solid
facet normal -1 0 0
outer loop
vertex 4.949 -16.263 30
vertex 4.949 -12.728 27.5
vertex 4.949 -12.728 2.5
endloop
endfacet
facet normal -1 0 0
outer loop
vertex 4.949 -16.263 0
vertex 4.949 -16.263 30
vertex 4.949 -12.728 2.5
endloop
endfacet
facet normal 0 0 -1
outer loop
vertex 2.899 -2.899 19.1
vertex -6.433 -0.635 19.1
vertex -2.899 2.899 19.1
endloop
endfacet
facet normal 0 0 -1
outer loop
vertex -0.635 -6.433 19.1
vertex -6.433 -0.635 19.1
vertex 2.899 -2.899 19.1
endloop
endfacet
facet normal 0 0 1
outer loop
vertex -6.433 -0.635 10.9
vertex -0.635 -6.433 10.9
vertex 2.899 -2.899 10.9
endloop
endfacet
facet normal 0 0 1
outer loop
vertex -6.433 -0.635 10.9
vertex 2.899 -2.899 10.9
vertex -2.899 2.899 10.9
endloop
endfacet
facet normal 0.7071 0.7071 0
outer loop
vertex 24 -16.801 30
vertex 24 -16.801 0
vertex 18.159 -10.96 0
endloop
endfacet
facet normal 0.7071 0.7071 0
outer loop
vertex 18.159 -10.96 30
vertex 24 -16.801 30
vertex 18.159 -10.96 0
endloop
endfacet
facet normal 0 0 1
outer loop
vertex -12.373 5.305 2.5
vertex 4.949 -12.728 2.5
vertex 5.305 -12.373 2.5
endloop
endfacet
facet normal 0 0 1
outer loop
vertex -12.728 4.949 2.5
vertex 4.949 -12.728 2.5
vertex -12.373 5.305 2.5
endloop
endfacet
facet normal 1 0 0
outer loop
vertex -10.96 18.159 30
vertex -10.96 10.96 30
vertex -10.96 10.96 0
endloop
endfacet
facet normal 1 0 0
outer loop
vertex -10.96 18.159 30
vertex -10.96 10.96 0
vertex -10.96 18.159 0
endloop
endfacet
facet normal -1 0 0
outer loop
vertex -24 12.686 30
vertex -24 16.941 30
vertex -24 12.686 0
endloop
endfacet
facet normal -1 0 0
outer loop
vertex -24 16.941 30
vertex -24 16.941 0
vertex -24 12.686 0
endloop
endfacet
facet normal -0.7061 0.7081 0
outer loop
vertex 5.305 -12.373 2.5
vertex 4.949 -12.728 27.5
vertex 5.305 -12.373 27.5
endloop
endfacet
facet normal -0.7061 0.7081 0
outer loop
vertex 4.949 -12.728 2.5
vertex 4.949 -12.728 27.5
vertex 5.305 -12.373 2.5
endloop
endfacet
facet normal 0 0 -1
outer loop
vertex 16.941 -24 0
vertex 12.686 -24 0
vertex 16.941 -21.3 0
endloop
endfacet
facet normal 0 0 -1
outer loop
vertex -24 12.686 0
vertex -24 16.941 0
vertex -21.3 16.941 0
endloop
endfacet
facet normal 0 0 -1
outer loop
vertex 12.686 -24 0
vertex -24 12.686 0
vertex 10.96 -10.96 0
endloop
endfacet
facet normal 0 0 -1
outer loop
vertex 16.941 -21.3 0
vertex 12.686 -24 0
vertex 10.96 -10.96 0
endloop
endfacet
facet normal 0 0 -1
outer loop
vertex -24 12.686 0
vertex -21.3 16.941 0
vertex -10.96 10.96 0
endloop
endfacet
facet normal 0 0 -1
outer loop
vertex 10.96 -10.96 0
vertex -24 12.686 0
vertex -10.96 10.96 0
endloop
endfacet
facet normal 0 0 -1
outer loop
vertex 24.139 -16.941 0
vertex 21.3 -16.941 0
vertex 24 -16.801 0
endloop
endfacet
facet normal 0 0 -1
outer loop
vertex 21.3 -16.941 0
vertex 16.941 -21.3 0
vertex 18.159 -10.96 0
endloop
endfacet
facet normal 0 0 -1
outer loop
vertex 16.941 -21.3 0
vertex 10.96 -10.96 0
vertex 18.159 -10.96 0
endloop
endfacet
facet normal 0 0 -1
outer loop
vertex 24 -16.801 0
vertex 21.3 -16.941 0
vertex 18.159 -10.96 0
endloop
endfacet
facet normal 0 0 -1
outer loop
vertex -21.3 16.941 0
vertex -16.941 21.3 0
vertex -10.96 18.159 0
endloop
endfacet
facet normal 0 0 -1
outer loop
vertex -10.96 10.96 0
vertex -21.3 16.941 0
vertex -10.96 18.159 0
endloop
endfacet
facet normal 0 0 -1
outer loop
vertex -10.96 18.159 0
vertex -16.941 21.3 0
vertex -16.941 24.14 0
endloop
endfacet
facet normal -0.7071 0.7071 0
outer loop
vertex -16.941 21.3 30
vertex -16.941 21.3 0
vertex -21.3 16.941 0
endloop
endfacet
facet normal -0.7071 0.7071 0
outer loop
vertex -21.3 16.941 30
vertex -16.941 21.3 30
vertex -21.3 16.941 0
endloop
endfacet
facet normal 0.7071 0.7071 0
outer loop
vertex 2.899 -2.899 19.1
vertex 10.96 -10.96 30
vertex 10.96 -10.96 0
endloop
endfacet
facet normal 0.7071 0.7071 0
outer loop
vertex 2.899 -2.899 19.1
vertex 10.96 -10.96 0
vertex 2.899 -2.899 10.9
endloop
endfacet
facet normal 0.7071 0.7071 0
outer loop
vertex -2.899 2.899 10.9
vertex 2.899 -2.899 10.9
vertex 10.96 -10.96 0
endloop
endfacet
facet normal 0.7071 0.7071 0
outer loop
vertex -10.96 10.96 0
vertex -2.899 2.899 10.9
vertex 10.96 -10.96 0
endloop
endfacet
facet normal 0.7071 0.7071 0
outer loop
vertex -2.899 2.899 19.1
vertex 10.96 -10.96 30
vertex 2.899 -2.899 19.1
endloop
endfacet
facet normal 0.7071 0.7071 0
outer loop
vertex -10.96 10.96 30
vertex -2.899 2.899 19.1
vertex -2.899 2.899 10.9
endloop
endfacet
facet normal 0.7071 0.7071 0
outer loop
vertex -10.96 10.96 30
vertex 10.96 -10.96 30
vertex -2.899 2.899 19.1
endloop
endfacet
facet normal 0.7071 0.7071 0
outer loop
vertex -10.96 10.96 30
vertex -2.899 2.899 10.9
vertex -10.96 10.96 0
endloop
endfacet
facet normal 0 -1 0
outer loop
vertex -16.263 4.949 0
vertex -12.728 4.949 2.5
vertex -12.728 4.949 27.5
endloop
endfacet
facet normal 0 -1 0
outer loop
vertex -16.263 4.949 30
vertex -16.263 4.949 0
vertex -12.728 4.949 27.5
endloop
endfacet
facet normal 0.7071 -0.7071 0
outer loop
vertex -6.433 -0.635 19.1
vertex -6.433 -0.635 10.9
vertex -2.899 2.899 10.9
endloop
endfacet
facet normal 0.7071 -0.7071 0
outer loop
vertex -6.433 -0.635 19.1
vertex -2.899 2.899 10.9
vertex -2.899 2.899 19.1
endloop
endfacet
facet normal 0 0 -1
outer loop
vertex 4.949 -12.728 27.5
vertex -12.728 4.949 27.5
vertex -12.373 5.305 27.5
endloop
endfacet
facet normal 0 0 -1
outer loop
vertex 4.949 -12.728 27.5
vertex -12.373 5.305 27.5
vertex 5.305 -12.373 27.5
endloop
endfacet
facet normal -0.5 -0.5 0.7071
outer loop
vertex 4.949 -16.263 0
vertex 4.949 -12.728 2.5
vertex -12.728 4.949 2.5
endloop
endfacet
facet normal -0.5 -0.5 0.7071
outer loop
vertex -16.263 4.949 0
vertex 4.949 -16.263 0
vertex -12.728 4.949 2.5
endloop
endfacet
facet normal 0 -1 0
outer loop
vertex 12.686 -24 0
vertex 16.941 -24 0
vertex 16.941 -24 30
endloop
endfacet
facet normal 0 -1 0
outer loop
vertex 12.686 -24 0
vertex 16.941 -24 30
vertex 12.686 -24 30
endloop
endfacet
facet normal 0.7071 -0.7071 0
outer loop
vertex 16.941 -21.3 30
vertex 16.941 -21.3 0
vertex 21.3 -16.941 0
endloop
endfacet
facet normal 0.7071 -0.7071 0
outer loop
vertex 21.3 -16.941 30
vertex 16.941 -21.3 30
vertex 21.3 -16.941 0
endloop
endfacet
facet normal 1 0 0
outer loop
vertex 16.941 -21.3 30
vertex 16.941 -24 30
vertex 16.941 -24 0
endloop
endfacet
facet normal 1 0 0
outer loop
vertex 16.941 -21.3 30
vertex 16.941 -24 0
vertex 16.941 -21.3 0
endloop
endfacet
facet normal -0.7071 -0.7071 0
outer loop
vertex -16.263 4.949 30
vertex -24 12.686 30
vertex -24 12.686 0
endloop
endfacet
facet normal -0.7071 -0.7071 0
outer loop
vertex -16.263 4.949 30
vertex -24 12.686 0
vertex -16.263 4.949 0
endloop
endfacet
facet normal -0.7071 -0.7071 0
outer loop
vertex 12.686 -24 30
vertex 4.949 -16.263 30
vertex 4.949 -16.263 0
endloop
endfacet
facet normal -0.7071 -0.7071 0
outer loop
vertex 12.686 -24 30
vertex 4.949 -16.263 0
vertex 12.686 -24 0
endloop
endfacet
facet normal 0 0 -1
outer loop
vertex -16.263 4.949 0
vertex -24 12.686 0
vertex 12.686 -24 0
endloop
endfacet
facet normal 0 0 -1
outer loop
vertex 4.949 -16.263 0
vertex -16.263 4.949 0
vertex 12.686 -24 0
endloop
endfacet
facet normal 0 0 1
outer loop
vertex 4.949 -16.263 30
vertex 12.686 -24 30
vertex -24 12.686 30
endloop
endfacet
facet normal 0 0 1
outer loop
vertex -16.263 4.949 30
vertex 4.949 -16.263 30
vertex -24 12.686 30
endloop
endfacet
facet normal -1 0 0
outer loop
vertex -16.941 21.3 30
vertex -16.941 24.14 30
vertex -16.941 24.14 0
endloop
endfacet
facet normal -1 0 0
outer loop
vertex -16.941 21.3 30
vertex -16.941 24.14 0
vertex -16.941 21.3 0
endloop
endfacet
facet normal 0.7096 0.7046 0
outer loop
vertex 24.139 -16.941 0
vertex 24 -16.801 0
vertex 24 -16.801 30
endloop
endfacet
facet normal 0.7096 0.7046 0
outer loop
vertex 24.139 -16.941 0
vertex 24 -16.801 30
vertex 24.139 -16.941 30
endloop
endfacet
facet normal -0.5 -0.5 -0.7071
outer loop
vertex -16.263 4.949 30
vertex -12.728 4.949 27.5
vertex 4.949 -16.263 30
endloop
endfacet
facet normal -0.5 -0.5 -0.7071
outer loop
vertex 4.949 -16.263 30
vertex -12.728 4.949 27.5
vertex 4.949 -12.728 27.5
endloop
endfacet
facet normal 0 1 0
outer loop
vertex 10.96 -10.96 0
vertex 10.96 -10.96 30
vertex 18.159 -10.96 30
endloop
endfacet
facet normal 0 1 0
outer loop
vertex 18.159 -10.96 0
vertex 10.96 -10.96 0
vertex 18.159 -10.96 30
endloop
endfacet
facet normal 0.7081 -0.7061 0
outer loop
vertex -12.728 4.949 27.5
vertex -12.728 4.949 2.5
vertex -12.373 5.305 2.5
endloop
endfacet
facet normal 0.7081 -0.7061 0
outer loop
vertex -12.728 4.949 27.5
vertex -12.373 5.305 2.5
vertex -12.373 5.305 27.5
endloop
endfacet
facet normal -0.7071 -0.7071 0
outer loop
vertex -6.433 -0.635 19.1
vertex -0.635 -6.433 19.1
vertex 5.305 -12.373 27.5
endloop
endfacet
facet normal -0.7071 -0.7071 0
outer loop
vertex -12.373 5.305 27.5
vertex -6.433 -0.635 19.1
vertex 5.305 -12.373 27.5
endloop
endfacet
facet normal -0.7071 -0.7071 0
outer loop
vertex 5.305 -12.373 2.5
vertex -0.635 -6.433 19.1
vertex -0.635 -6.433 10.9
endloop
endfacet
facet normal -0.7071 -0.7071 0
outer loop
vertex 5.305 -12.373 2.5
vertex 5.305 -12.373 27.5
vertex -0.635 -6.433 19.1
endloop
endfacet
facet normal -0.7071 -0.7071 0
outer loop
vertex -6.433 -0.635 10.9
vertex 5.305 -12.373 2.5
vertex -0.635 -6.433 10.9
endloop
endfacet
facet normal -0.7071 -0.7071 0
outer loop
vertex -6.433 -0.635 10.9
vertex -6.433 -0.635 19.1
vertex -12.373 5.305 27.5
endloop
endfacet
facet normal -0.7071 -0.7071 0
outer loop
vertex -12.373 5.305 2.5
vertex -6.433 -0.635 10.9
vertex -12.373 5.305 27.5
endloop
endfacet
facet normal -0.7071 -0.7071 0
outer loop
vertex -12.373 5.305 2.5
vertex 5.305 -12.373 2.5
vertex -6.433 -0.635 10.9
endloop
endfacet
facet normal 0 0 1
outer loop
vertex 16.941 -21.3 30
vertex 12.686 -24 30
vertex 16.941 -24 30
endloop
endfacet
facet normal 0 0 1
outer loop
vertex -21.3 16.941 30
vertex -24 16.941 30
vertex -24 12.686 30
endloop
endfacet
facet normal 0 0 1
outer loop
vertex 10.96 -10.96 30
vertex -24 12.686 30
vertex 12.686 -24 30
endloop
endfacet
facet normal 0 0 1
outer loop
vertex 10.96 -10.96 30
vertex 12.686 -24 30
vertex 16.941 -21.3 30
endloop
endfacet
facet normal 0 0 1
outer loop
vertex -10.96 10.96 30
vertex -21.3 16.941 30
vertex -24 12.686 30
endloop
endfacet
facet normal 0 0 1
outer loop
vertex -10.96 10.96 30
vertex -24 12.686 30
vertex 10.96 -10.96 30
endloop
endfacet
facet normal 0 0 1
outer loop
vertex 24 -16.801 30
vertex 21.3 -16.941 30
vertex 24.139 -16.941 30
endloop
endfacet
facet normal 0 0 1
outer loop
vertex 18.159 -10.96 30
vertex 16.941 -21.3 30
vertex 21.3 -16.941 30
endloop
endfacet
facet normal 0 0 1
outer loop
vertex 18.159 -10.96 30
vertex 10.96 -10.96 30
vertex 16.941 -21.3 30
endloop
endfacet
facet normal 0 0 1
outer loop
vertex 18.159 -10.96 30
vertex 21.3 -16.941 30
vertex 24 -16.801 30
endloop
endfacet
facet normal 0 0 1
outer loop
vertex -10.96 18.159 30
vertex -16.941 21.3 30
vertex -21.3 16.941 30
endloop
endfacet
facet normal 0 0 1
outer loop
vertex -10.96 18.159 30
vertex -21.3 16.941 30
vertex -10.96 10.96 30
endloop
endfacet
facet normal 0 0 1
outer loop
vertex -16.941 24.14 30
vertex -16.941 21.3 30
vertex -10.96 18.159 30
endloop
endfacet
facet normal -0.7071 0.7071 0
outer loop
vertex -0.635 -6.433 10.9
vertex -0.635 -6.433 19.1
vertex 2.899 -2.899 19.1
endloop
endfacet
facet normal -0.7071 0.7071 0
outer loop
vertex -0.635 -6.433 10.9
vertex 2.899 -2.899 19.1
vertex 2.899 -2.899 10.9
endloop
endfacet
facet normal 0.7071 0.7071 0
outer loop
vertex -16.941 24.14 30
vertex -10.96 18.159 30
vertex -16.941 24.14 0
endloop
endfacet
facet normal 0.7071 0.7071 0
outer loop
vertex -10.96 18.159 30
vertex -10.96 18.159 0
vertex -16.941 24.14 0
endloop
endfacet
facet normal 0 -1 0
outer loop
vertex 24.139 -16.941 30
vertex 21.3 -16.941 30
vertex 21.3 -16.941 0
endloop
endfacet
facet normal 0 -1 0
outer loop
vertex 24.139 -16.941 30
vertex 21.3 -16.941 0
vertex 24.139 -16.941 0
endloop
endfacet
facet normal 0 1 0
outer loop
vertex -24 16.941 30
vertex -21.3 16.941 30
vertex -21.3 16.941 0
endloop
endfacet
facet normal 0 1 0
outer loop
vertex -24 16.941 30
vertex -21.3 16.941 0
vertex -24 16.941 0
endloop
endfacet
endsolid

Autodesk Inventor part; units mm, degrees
ref_plane "YZ Plane" through (0, 0, 0) normal (1, 0, 0) x (0, 1, 0)
ref_plane "XZ Plane" through (0, 0, 0) normal (0, 1, 0) x (-1, 0, 0)
ref_plane "XY Plane" through (0, 0, 0) normal (0, 0, 1) x (1, 0, 0)
sketch "Sketch1" plane through (0, 0, 0) normal (0, 0, 1) x (1, 0, 0)
  line L0 (-16.8009, 21.2415) -> (21.2415, -16.8009)
  line L1 (21.2415, -16.8009) -> (16.8009, -21.2415)
  line L2 (16.8009, -21.2415) -> (-21.2415, 16.8009)
  line L3 (-21.2415, 16.8009) -> (-16.8009, 21.2415)
  line L4 (-16.8009, 21.2415) -> (16.8009, -21.2415) construction
  line L5 (21.2415, -16.8009) -> (-21.2415, 16.8009) construction
  line L6 (-16.8009, 21.2415) -> (36.9991, 21.2415) construction
  line L7 (-21.2415, 16.8009) -> (-24, 16.8009)
  line L8 (16.8009, -21.2415) -> (16.8009, -24)
  line L9 (16.8009, -24) -> (-24, 16.8009)
  line L10 (-16.8009, 21.2415) -> (-16.8009, 24)
  line L11 (21.2415, -16.8009) -> (24, -16.8009)
  line L12 (24, -16.8009) -> (-16.8009, 24)
  line L13 (-24, 16.8009) -> (-24, 12.6863)
  line L14 (16.8009, -24) -> (12.6863, -24)
  line L15 (-24, 12.6863) -> (12.6863, -24)
  line L16 (-24, 16.8009) -> (-11.8721, 28.9288) construction
  line L17 (-24, 16.8009) -> (-6.8486, 16.8009) construction
  point P0 (0, 0)
  dimension "d0" = 53.8
  dimension "d1" = 45
  dimension "d2" = 6.28
  dimension "d5" = 8
  dimension "d72" = 24
  dimension "d73" = 45
extrude "Extrusion1" add sketch "Sketch1" along normal blind 30
ref_plane "Work Plane1" through (16.9, -16.9, -8) normal (-0.7071, -0.7071, 0) x (0, 0, 1)
sketch "Sketch7" plane through (0, 0, 30) normal (0, 0, 1) x (1, 0, 0)
  line L0 (21.2415, -16.8009) -> (24, -16.8009) projected
  line L1 (24, -16.8009) -> (-16.8009, 24) projected
  line L2 (-16.8009, 24) -> (-16.8009, 21.2415) projected
  line L3 (-16.8009, 21.2415) -> (-21.2415, 16.8009) projected
  line L4 (-21.2415, 16.8009) -> (-24, 16.8009) projected
  line L5 (-24, 16.8009) -> (-24, 12.6863) projected
  line L6 (-24, 12.6863) -> (12.6863, -24) projected
  line L7 (12.6863, -24) -> (16.8009, -24) projected
  line L8 (16.8009, -24) -> (16.8009, -21.2415) projected
  line L9 (16.8009, -21.2415) -> (21.2415, -16.8009) projected
  line L10 (3.5996, 3.5996) -> (-5.6569, -5.6569)
  line L11 (-24, 12.6863) -> (12.6863, -24) projected
  line L12 (18.1593, -3.761) -> (10.9602, -10.9602)
  line L13 (10.9602, -10.9602) -> (-10.9602, 10.9602)
  line L14 (-10.9602, 10.9602) -> (-3.761, 18.1593)
  line L15 (-3.761, 18.1593) -> (18.1593, -3.761)
  line L16 (18.1593, -3.761) -> (-10.9602, 10.9602) construction
  line L17 (10.9602, -10.9602) -> (-3.761, 18.1593) construction
  line L18 (-10.9602, 10.9602) -> (-10.9602, 18.1593)
  line L19 (24, -16.8009) -> (-16.8009, 24) projected
  line L20 (10.9602, -10.9602) -> (18.1593, -10.9602)
  point P0 (0, 0)
  dimension "d28" = 31
  dimension "d29" = 0
  dimension "d74" = 0
extrude "Extrusion7" cut sketch "Sketch7" against normal through all contours L20 L12 L1 | L12 L13 L10 L1 | L1 L14 L15 L12 | L10 L13 L14 L1 | L14 L18 L1
sketch "Sketch13" plane through (0, 0, 30) normal (0, 0, 1) x (1, 0, 0)
  line L0 (-10.9602, 18.1593) -> (-16.8009, 24) construction
  line L1 (-16.8009, 24) -> (-16.8009, 21.2415) projected
  line L2 (-16.8009, 21.2415) -> (-21.2415, 16.8009) projected
  line L3 (-21.2415, 16.8009) -> (-24, 16.8009) projected
  line L4 (-24, 16.8009) -> (-24, 12.6863) construction
  line L5 (-24, 12.6863) -> (12.6863, -24) construction
  line L6 (12.6863, -24) -> (16.8009, -24) construction
  line L7 (16.8009, -24) -> (16.8009, -21.2415) projected
  line L8 (16.8009, -21.2415) -> (21.2415, -16.8009) projected
  line L9 (21.2415, -16.8009) -> (24, -16.8009) projected
  line L10 (24.1, -24.6971) -> (24.1, -16.7029) construction
  line L11 (24.1, -16.7029) -> (-16.9409, 24.338) construction
  line L12 (-16.9409, 24.338) -> (-16.9409, 21.2995)
  line L13 (-16.9409, 21.2995) -> (-21.2995, 16.9409)
  line L14 (-21.2995, 16.9409) -> (-24.14, 16.9409)
  line L15 (-24.14, 16.9409) -> (-24.14, 12.6283) construction
  line L16 (-24.14, 12.6283) -> (12.6283, -24.14) construction
  line L17 (12.6283, -24.14) -> (16.9409, -24.14) construction
  line L18 (16.9409, -24.14) -> (16.9409, -21.2995)
  line L19 (16.9409, -21.2995) -> (21.2995, -16.9409)
  line L20 (21.2995, -16.9409) -> (24.2814, -16.9409)
  line L21 (24.2814, -16.9409) -> (53.8994, -46.5588) construction
  line L22 (53.8994, -46.5588) -> (45.9617, -46.5588) construction
  line L23 (45.9617, -46.5588) -> (24.1, -24.6971) construction
  line L24 (16.8009, -24) -> (16.9409, -24)
  line L25 (24, -16.8009) -> (24.1393, -16.9409)
  line L26 (-21.2415, 16.8009) -> (-22.9, 16.8009) projected
  line L27 (18.1593, -10.9602) -> (10.9602, -10.9602) projected
  line L28 (10.9602, -10.9602) -> (-10.9602, 10.9602) projected
  line L29 (-10.9602, 10.9602) -> (-10.9602, 18.1593) projected
  line L30 (24, -16.8009) -> (18.1593, -10.9602) projected
  line L31 (-24, 12.6863) -> (-24, 16.8009) projected
  line L32 (-24, 16.8009) -> (-24, 16.9409)
  line L33 (-16.8009, 24) -> (-16.9409, 24.14)
  point P0 (0, 0)
  point P1 (-22.9, 16.9409)
  dimension "d93" = 0.14
extrude "IM_offset" add sketch "Sketch13" against normal up to surface (30 mm away)
sketch "Skizze14" plane through (12.6863, -24, 30) normal (-0.7071, -0.7071, 0) x (-0.7071, 0.7071, 0)
  line L0 (21.8411, 19.1) -> (30.0411, 19.1)
  line L1 (30.0411, 19.1) -> (30.0411, 10.9)
  line L2 (30.0411, 10.9) -> (21.8411, 10.9)
  line L3 (21.8411, 10.9) -> (21.8411, 19.1)
  line L4 (21.8411, 19.1) -> (30.0411, 10.9) construction
  line L5 (30.0411, 19.1) -> (21.8411, 10.9) construction
  line L6 (0, 30) -> (0, 0) construction
  line L7 (51.8823, 30) -> (51.8823, 0) construction
  line L8 (0, 30) -> (51.8823, 0) construction
  line L9 (51.8823, 0) -> (51.8823, 30) construction
  line L10 (51.8823, 30) -> (0, 0) construction
  line L11 (-2.9094, 0) -> (5.3506, 0) construction
  point P0 (25.9411, 30)
  point P1 (25.9411, 15)
  dimension "d94" = 8.2
  dimension "d95" = 8.2
extrude "Extrusion11" cut sketch "Skizze14" against normal blind 10
sketch "Skizze15" plane through (12.6863, -24, 30) normal (-0.7071, -0.7071, 0) x (-0.7071, 0.7071, 0)
  line L0 (30.0411, 19.1) -> (30.0411, 10.9) projected
  line L1 (30.0411, 10.9) -> (21.8411, 10.9) projected
  line L2 (21.8411, 10.9) -> (21.8411, 19.1) projected
  line L3 (21.8411, 19.1) -> (30.0411, 19.1) projected
  line L4 (0, 30) -> (51.8823, 30) projected
  line L5 (0, 30) -> (0, 0) projected
  line L6 (51.8823, 0) -> (0, 0) projected
  line L7 (51.8823, 30) -> (51.8823, 0) projected
  line L8 (51.8823, 30) -> (51.8823, 0) projected
  line L9 (0, 30) -> (0, 0) projected
  line L10 (51.8823, 30) -> (0, 0)
  line L11 (0, 0) -> (0, 30)
  line L12 (-2.9094, 30) -> (5.3506, 30) projected
  line L13 (51.8823, 0) -> (0, 30)
  line L14 (38.4411, 2.5) -> (13.4411, 2.5)
  line L15 (13.4411, 2.5) -> (13.4411, 27.5)
  line L16 (13.4411, 27.5) -> (38.4411, 27.5)
  line L17 (38.4411, 27.5) -> (38.4411, 2.5)
  line L18 (38.4411, 2.5) -> (13.4411, 27.5) construction
  line L19 (13.4411, 2.5) -> (38.4411, 27.5) construction
  point P0 (25.9411, 30)
  point P1 (25.9411, 15)
  dimension "d98" = 25
  dimension "d99" = 25
extrude "Extrusion12" cut sketch "Skizze15" against normal blind 3 contours L3 L2 L13 L15 L16 L17 L10 L0 | L10 L17 L13 L0 | L13 L17 L14 L15 L10 L2 L1 L0 | L2 L10 L15 L13
chamfer "Fase1" distance 2.5 angle 45 4 edges at (3.182, -14.4957, 15) (-5.6569, -5.6569, 27.5) (-14.4957, 3.182, 15) (-5.6569, -5.6569, 2.5)
equation "\"d3\" = MirrorThickness1"
equation "\"MirrorThickness1\" = 30"
properties part number "20_Cube_Insert_Mirror_Holder_wLogo_v3"
